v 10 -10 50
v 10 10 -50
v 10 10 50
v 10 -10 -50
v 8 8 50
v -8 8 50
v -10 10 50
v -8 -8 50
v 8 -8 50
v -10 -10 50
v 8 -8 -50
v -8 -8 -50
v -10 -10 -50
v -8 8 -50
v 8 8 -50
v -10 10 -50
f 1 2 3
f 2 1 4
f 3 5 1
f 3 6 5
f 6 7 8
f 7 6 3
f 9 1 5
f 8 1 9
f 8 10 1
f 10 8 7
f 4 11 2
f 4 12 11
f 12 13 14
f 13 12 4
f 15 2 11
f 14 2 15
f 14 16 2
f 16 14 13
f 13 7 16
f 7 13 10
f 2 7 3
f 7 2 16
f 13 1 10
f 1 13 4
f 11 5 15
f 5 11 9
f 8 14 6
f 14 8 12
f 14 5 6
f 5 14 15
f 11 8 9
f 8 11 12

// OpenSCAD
$fn=64;

module box_section_20x20x2(len=100, outer=20, wall=2) {
    difference() {
        cube([outer, outer, len], center=true);
        cube([outer-2*wall, outer-2*wall, len+0.2], center=true);
    }
}

box_section_20x20x2(len=100, outer=20, wall=2);
